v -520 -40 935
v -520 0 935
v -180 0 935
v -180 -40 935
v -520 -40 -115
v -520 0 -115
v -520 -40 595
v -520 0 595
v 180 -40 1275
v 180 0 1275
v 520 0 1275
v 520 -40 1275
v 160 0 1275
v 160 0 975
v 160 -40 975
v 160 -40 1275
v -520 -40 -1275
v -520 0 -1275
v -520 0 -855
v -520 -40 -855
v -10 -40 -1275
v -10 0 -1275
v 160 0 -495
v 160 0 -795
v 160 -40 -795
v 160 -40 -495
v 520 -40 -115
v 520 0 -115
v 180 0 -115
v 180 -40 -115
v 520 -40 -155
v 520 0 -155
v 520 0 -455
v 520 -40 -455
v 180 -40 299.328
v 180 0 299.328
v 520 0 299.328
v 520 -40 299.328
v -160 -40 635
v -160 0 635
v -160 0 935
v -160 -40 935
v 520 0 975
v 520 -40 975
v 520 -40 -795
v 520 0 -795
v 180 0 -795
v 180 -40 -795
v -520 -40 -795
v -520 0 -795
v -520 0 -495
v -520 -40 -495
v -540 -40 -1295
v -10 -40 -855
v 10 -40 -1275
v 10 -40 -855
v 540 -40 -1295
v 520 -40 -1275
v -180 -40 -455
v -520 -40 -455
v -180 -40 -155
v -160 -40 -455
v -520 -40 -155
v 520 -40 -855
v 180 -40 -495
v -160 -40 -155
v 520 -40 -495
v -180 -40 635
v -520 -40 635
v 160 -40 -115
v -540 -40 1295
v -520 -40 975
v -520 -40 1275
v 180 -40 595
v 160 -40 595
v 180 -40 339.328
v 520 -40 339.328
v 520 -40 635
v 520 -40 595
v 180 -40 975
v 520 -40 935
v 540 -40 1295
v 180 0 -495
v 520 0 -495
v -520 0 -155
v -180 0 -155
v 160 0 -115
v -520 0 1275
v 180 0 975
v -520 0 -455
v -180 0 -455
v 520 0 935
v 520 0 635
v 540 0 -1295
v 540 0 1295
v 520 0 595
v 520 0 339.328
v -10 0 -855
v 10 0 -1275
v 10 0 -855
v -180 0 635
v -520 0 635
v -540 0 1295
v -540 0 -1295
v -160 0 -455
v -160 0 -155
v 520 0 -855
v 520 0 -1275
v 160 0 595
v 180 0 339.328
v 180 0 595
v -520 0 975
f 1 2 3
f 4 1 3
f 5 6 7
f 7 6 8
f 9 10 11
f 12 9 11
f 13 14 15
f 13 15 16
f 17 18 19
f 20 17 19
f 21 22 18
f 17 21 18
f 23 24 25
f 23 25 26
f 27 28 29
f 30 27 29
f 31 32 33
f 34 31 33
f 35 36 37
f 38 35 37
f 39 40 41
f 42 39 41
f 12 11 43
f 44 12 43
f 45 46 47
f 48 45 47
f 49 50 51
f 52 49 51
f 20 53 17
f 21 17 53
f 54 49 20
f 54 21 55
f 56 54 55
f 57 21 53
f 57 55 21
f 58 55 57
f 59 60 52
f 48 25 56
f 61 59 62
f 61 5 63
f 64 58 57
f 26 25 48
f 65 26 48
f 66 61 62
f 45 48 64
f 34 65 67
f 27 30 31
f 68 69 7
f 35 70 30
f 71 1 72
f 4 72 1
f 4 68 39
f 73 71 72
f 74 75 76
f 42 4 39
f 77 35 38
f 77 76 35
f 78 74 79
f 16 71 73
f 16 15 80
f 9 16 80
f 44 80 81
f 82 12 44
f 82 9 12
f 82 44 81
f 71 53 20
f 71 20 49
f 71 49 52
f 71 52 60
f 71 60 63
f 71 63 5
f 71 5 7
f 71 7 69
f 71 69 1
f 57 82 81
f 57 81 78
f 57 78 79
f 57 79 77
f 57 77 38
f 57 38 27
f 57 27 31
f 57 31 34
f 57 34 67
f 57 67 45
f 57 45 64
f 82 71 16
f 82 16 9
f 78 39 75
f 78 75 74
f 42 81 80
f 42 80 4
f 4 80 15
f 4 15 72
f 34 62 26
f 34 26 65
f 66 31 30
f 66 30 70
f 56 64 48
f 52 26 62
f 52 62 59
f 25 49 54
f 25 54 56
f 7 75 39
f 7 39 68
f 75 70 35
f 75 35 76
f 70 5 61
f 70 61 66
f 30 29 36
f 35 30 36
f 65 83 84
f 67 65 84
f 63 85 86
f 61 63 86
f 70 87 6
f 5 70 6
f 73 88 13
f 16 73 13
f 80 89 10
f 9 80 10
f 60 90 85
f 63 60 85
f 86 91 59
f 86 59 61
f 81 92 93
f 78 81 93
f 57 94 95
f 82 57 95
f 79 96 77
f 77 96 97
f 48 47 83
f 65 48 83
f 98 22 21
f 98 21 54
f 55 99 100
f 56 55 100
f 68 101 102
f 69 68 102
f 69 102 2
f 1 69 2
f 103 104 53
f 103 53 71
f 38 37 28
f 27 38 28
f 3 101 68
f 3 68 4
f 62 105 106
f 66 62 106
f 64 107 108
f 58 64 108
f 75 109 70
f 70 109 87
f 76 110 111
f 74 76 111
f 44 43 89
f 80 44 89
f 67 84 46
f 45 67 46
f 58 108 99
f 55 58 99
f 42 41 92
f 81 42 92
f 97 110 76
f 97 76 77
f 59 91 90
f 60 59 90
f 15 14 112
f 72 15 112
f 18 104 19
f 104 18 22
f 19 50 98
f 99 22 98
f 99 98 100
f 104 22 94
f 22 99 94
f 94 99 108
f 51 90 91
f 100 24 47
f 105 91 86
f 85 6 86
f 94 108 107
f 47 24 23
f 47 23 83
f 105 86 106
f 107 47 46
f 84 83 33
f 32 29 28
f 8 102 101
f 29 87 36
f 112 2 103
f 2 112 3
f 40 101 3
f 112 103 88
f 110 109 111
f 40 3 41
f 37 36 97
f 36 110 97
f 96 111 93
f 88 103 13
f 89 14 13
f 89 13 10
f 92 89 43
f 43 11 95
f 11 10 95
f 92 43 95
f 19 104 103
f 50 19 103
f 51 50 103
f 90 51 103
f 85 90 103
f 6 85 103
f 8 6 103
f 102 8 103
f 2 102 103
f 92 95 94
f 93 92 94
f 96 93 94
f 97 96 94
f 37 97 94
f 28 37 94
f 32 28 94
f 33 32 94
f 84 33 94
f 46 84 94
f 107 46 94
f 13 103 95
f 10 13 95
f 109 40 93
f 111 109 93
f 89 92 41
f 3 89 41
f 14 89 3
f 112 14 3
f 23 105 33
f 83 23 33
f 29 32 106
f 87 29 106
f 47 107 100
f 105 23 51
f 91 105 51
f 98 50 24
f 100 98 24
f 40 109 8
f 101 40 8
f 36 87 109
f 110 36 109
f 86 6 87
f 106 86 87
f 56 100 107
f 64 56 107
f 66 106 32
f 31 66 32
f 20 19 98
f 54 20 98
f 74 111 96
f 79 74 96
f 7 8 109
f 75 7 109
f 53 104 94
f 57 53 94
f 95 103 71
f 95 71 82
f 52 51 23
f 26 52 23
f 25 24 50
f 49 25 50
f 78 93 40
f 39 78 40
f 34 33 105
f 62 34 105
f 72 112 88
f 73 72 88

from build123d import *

# Parameters (mm, degrees)
F0_W     = 1080
F0_H     = 2590
F0_W_2   = 20
F0_H_2   = 300
F0_W_3   = 340
F0_H_3   = 40
F0_H_4   = 420
F1_DEPTH = 40


# Not quite as in the source:
# - a feature names something its author has since deleted; it is built from what else it names


with BuildPart() as f1:
    # F0 (on Front) → F1 (new body)
    with BuildSketch(Plane.XZ):
        Rectangle(F0_W, F0_H)
        Polygon((520, -855), (520, -1275), (10, -1275), (-10, -1275), (-520, -1275), (-520, -855), (-520, -795), (-520, -495), (-520, -455), (-520, -155), (-520, -115), (-520, 595), (-520, 635), (-520, 935), (-520, 975), (-520, 1275), (160, 1275), (180, 1275), (520, 1275), (520, 975), (520, 935), (520, 635), (520, 595), (520, 339.328327179), (520, 299.328327179), (520, -115), (520, -155), (520, -455), (520, -495), (520, -795), align=None, mode=Mode.SUBTRACT)
        with Locations((170, 1125)):
            Rectangle(F0_W_2, F0_H_2)
        Polygon((-160, 935), (520, 935), (520, 975), (180, 975), (160, 975), (-520, 975), (-520, 935), (-180, 935), align=None)
        with Locations((-170, 785)):
            Rectangle(F0_W_2, F0_H_2)
        Polygon((180, 595), (520, 595), (520, 635), (-160, 635), (-180, 635), (-520, 635), (-520, 595), (160, 595), align=None)
        Polygon((160, -115), (180, -115), (180, 299.328327179), (180, 339.328327179), (180, 595), (160, 595), (160, 80), (160, 40), align=None)
        with Locations((350, 319.328327179)):
            Rectangle(F0_W_3, F0_H_3)
        Polygon((-160, -155), (520, -155), (520, -115), (180, -115), (160, -115), (-520, -115), (-520, -155), (-180, -155), align=None)
        with Locations((-170, -305)):
            Rectangle(F0_W_2, F0_H_2)
        Polygon((180, -495), (520, -495), (520, -455), (-160, -455), (-180, -455), (-520, -455), (-520, -495), (160, -495), align=None)
        with Locations((170, -645)):
            Rectangle(F0_W_2, F0_H_2)
        Polygon((10, -855), (520, -855), (520, -795), (180, -795), (160, -795), (-520, -795), (-520, -855), (-10, -855), align=None)
        with Locations((0, -1065)):
            Rectangle(F0_W_2, F0_H_4)
    extrude(amount=F1_DEPTH)


solid = f1.part
